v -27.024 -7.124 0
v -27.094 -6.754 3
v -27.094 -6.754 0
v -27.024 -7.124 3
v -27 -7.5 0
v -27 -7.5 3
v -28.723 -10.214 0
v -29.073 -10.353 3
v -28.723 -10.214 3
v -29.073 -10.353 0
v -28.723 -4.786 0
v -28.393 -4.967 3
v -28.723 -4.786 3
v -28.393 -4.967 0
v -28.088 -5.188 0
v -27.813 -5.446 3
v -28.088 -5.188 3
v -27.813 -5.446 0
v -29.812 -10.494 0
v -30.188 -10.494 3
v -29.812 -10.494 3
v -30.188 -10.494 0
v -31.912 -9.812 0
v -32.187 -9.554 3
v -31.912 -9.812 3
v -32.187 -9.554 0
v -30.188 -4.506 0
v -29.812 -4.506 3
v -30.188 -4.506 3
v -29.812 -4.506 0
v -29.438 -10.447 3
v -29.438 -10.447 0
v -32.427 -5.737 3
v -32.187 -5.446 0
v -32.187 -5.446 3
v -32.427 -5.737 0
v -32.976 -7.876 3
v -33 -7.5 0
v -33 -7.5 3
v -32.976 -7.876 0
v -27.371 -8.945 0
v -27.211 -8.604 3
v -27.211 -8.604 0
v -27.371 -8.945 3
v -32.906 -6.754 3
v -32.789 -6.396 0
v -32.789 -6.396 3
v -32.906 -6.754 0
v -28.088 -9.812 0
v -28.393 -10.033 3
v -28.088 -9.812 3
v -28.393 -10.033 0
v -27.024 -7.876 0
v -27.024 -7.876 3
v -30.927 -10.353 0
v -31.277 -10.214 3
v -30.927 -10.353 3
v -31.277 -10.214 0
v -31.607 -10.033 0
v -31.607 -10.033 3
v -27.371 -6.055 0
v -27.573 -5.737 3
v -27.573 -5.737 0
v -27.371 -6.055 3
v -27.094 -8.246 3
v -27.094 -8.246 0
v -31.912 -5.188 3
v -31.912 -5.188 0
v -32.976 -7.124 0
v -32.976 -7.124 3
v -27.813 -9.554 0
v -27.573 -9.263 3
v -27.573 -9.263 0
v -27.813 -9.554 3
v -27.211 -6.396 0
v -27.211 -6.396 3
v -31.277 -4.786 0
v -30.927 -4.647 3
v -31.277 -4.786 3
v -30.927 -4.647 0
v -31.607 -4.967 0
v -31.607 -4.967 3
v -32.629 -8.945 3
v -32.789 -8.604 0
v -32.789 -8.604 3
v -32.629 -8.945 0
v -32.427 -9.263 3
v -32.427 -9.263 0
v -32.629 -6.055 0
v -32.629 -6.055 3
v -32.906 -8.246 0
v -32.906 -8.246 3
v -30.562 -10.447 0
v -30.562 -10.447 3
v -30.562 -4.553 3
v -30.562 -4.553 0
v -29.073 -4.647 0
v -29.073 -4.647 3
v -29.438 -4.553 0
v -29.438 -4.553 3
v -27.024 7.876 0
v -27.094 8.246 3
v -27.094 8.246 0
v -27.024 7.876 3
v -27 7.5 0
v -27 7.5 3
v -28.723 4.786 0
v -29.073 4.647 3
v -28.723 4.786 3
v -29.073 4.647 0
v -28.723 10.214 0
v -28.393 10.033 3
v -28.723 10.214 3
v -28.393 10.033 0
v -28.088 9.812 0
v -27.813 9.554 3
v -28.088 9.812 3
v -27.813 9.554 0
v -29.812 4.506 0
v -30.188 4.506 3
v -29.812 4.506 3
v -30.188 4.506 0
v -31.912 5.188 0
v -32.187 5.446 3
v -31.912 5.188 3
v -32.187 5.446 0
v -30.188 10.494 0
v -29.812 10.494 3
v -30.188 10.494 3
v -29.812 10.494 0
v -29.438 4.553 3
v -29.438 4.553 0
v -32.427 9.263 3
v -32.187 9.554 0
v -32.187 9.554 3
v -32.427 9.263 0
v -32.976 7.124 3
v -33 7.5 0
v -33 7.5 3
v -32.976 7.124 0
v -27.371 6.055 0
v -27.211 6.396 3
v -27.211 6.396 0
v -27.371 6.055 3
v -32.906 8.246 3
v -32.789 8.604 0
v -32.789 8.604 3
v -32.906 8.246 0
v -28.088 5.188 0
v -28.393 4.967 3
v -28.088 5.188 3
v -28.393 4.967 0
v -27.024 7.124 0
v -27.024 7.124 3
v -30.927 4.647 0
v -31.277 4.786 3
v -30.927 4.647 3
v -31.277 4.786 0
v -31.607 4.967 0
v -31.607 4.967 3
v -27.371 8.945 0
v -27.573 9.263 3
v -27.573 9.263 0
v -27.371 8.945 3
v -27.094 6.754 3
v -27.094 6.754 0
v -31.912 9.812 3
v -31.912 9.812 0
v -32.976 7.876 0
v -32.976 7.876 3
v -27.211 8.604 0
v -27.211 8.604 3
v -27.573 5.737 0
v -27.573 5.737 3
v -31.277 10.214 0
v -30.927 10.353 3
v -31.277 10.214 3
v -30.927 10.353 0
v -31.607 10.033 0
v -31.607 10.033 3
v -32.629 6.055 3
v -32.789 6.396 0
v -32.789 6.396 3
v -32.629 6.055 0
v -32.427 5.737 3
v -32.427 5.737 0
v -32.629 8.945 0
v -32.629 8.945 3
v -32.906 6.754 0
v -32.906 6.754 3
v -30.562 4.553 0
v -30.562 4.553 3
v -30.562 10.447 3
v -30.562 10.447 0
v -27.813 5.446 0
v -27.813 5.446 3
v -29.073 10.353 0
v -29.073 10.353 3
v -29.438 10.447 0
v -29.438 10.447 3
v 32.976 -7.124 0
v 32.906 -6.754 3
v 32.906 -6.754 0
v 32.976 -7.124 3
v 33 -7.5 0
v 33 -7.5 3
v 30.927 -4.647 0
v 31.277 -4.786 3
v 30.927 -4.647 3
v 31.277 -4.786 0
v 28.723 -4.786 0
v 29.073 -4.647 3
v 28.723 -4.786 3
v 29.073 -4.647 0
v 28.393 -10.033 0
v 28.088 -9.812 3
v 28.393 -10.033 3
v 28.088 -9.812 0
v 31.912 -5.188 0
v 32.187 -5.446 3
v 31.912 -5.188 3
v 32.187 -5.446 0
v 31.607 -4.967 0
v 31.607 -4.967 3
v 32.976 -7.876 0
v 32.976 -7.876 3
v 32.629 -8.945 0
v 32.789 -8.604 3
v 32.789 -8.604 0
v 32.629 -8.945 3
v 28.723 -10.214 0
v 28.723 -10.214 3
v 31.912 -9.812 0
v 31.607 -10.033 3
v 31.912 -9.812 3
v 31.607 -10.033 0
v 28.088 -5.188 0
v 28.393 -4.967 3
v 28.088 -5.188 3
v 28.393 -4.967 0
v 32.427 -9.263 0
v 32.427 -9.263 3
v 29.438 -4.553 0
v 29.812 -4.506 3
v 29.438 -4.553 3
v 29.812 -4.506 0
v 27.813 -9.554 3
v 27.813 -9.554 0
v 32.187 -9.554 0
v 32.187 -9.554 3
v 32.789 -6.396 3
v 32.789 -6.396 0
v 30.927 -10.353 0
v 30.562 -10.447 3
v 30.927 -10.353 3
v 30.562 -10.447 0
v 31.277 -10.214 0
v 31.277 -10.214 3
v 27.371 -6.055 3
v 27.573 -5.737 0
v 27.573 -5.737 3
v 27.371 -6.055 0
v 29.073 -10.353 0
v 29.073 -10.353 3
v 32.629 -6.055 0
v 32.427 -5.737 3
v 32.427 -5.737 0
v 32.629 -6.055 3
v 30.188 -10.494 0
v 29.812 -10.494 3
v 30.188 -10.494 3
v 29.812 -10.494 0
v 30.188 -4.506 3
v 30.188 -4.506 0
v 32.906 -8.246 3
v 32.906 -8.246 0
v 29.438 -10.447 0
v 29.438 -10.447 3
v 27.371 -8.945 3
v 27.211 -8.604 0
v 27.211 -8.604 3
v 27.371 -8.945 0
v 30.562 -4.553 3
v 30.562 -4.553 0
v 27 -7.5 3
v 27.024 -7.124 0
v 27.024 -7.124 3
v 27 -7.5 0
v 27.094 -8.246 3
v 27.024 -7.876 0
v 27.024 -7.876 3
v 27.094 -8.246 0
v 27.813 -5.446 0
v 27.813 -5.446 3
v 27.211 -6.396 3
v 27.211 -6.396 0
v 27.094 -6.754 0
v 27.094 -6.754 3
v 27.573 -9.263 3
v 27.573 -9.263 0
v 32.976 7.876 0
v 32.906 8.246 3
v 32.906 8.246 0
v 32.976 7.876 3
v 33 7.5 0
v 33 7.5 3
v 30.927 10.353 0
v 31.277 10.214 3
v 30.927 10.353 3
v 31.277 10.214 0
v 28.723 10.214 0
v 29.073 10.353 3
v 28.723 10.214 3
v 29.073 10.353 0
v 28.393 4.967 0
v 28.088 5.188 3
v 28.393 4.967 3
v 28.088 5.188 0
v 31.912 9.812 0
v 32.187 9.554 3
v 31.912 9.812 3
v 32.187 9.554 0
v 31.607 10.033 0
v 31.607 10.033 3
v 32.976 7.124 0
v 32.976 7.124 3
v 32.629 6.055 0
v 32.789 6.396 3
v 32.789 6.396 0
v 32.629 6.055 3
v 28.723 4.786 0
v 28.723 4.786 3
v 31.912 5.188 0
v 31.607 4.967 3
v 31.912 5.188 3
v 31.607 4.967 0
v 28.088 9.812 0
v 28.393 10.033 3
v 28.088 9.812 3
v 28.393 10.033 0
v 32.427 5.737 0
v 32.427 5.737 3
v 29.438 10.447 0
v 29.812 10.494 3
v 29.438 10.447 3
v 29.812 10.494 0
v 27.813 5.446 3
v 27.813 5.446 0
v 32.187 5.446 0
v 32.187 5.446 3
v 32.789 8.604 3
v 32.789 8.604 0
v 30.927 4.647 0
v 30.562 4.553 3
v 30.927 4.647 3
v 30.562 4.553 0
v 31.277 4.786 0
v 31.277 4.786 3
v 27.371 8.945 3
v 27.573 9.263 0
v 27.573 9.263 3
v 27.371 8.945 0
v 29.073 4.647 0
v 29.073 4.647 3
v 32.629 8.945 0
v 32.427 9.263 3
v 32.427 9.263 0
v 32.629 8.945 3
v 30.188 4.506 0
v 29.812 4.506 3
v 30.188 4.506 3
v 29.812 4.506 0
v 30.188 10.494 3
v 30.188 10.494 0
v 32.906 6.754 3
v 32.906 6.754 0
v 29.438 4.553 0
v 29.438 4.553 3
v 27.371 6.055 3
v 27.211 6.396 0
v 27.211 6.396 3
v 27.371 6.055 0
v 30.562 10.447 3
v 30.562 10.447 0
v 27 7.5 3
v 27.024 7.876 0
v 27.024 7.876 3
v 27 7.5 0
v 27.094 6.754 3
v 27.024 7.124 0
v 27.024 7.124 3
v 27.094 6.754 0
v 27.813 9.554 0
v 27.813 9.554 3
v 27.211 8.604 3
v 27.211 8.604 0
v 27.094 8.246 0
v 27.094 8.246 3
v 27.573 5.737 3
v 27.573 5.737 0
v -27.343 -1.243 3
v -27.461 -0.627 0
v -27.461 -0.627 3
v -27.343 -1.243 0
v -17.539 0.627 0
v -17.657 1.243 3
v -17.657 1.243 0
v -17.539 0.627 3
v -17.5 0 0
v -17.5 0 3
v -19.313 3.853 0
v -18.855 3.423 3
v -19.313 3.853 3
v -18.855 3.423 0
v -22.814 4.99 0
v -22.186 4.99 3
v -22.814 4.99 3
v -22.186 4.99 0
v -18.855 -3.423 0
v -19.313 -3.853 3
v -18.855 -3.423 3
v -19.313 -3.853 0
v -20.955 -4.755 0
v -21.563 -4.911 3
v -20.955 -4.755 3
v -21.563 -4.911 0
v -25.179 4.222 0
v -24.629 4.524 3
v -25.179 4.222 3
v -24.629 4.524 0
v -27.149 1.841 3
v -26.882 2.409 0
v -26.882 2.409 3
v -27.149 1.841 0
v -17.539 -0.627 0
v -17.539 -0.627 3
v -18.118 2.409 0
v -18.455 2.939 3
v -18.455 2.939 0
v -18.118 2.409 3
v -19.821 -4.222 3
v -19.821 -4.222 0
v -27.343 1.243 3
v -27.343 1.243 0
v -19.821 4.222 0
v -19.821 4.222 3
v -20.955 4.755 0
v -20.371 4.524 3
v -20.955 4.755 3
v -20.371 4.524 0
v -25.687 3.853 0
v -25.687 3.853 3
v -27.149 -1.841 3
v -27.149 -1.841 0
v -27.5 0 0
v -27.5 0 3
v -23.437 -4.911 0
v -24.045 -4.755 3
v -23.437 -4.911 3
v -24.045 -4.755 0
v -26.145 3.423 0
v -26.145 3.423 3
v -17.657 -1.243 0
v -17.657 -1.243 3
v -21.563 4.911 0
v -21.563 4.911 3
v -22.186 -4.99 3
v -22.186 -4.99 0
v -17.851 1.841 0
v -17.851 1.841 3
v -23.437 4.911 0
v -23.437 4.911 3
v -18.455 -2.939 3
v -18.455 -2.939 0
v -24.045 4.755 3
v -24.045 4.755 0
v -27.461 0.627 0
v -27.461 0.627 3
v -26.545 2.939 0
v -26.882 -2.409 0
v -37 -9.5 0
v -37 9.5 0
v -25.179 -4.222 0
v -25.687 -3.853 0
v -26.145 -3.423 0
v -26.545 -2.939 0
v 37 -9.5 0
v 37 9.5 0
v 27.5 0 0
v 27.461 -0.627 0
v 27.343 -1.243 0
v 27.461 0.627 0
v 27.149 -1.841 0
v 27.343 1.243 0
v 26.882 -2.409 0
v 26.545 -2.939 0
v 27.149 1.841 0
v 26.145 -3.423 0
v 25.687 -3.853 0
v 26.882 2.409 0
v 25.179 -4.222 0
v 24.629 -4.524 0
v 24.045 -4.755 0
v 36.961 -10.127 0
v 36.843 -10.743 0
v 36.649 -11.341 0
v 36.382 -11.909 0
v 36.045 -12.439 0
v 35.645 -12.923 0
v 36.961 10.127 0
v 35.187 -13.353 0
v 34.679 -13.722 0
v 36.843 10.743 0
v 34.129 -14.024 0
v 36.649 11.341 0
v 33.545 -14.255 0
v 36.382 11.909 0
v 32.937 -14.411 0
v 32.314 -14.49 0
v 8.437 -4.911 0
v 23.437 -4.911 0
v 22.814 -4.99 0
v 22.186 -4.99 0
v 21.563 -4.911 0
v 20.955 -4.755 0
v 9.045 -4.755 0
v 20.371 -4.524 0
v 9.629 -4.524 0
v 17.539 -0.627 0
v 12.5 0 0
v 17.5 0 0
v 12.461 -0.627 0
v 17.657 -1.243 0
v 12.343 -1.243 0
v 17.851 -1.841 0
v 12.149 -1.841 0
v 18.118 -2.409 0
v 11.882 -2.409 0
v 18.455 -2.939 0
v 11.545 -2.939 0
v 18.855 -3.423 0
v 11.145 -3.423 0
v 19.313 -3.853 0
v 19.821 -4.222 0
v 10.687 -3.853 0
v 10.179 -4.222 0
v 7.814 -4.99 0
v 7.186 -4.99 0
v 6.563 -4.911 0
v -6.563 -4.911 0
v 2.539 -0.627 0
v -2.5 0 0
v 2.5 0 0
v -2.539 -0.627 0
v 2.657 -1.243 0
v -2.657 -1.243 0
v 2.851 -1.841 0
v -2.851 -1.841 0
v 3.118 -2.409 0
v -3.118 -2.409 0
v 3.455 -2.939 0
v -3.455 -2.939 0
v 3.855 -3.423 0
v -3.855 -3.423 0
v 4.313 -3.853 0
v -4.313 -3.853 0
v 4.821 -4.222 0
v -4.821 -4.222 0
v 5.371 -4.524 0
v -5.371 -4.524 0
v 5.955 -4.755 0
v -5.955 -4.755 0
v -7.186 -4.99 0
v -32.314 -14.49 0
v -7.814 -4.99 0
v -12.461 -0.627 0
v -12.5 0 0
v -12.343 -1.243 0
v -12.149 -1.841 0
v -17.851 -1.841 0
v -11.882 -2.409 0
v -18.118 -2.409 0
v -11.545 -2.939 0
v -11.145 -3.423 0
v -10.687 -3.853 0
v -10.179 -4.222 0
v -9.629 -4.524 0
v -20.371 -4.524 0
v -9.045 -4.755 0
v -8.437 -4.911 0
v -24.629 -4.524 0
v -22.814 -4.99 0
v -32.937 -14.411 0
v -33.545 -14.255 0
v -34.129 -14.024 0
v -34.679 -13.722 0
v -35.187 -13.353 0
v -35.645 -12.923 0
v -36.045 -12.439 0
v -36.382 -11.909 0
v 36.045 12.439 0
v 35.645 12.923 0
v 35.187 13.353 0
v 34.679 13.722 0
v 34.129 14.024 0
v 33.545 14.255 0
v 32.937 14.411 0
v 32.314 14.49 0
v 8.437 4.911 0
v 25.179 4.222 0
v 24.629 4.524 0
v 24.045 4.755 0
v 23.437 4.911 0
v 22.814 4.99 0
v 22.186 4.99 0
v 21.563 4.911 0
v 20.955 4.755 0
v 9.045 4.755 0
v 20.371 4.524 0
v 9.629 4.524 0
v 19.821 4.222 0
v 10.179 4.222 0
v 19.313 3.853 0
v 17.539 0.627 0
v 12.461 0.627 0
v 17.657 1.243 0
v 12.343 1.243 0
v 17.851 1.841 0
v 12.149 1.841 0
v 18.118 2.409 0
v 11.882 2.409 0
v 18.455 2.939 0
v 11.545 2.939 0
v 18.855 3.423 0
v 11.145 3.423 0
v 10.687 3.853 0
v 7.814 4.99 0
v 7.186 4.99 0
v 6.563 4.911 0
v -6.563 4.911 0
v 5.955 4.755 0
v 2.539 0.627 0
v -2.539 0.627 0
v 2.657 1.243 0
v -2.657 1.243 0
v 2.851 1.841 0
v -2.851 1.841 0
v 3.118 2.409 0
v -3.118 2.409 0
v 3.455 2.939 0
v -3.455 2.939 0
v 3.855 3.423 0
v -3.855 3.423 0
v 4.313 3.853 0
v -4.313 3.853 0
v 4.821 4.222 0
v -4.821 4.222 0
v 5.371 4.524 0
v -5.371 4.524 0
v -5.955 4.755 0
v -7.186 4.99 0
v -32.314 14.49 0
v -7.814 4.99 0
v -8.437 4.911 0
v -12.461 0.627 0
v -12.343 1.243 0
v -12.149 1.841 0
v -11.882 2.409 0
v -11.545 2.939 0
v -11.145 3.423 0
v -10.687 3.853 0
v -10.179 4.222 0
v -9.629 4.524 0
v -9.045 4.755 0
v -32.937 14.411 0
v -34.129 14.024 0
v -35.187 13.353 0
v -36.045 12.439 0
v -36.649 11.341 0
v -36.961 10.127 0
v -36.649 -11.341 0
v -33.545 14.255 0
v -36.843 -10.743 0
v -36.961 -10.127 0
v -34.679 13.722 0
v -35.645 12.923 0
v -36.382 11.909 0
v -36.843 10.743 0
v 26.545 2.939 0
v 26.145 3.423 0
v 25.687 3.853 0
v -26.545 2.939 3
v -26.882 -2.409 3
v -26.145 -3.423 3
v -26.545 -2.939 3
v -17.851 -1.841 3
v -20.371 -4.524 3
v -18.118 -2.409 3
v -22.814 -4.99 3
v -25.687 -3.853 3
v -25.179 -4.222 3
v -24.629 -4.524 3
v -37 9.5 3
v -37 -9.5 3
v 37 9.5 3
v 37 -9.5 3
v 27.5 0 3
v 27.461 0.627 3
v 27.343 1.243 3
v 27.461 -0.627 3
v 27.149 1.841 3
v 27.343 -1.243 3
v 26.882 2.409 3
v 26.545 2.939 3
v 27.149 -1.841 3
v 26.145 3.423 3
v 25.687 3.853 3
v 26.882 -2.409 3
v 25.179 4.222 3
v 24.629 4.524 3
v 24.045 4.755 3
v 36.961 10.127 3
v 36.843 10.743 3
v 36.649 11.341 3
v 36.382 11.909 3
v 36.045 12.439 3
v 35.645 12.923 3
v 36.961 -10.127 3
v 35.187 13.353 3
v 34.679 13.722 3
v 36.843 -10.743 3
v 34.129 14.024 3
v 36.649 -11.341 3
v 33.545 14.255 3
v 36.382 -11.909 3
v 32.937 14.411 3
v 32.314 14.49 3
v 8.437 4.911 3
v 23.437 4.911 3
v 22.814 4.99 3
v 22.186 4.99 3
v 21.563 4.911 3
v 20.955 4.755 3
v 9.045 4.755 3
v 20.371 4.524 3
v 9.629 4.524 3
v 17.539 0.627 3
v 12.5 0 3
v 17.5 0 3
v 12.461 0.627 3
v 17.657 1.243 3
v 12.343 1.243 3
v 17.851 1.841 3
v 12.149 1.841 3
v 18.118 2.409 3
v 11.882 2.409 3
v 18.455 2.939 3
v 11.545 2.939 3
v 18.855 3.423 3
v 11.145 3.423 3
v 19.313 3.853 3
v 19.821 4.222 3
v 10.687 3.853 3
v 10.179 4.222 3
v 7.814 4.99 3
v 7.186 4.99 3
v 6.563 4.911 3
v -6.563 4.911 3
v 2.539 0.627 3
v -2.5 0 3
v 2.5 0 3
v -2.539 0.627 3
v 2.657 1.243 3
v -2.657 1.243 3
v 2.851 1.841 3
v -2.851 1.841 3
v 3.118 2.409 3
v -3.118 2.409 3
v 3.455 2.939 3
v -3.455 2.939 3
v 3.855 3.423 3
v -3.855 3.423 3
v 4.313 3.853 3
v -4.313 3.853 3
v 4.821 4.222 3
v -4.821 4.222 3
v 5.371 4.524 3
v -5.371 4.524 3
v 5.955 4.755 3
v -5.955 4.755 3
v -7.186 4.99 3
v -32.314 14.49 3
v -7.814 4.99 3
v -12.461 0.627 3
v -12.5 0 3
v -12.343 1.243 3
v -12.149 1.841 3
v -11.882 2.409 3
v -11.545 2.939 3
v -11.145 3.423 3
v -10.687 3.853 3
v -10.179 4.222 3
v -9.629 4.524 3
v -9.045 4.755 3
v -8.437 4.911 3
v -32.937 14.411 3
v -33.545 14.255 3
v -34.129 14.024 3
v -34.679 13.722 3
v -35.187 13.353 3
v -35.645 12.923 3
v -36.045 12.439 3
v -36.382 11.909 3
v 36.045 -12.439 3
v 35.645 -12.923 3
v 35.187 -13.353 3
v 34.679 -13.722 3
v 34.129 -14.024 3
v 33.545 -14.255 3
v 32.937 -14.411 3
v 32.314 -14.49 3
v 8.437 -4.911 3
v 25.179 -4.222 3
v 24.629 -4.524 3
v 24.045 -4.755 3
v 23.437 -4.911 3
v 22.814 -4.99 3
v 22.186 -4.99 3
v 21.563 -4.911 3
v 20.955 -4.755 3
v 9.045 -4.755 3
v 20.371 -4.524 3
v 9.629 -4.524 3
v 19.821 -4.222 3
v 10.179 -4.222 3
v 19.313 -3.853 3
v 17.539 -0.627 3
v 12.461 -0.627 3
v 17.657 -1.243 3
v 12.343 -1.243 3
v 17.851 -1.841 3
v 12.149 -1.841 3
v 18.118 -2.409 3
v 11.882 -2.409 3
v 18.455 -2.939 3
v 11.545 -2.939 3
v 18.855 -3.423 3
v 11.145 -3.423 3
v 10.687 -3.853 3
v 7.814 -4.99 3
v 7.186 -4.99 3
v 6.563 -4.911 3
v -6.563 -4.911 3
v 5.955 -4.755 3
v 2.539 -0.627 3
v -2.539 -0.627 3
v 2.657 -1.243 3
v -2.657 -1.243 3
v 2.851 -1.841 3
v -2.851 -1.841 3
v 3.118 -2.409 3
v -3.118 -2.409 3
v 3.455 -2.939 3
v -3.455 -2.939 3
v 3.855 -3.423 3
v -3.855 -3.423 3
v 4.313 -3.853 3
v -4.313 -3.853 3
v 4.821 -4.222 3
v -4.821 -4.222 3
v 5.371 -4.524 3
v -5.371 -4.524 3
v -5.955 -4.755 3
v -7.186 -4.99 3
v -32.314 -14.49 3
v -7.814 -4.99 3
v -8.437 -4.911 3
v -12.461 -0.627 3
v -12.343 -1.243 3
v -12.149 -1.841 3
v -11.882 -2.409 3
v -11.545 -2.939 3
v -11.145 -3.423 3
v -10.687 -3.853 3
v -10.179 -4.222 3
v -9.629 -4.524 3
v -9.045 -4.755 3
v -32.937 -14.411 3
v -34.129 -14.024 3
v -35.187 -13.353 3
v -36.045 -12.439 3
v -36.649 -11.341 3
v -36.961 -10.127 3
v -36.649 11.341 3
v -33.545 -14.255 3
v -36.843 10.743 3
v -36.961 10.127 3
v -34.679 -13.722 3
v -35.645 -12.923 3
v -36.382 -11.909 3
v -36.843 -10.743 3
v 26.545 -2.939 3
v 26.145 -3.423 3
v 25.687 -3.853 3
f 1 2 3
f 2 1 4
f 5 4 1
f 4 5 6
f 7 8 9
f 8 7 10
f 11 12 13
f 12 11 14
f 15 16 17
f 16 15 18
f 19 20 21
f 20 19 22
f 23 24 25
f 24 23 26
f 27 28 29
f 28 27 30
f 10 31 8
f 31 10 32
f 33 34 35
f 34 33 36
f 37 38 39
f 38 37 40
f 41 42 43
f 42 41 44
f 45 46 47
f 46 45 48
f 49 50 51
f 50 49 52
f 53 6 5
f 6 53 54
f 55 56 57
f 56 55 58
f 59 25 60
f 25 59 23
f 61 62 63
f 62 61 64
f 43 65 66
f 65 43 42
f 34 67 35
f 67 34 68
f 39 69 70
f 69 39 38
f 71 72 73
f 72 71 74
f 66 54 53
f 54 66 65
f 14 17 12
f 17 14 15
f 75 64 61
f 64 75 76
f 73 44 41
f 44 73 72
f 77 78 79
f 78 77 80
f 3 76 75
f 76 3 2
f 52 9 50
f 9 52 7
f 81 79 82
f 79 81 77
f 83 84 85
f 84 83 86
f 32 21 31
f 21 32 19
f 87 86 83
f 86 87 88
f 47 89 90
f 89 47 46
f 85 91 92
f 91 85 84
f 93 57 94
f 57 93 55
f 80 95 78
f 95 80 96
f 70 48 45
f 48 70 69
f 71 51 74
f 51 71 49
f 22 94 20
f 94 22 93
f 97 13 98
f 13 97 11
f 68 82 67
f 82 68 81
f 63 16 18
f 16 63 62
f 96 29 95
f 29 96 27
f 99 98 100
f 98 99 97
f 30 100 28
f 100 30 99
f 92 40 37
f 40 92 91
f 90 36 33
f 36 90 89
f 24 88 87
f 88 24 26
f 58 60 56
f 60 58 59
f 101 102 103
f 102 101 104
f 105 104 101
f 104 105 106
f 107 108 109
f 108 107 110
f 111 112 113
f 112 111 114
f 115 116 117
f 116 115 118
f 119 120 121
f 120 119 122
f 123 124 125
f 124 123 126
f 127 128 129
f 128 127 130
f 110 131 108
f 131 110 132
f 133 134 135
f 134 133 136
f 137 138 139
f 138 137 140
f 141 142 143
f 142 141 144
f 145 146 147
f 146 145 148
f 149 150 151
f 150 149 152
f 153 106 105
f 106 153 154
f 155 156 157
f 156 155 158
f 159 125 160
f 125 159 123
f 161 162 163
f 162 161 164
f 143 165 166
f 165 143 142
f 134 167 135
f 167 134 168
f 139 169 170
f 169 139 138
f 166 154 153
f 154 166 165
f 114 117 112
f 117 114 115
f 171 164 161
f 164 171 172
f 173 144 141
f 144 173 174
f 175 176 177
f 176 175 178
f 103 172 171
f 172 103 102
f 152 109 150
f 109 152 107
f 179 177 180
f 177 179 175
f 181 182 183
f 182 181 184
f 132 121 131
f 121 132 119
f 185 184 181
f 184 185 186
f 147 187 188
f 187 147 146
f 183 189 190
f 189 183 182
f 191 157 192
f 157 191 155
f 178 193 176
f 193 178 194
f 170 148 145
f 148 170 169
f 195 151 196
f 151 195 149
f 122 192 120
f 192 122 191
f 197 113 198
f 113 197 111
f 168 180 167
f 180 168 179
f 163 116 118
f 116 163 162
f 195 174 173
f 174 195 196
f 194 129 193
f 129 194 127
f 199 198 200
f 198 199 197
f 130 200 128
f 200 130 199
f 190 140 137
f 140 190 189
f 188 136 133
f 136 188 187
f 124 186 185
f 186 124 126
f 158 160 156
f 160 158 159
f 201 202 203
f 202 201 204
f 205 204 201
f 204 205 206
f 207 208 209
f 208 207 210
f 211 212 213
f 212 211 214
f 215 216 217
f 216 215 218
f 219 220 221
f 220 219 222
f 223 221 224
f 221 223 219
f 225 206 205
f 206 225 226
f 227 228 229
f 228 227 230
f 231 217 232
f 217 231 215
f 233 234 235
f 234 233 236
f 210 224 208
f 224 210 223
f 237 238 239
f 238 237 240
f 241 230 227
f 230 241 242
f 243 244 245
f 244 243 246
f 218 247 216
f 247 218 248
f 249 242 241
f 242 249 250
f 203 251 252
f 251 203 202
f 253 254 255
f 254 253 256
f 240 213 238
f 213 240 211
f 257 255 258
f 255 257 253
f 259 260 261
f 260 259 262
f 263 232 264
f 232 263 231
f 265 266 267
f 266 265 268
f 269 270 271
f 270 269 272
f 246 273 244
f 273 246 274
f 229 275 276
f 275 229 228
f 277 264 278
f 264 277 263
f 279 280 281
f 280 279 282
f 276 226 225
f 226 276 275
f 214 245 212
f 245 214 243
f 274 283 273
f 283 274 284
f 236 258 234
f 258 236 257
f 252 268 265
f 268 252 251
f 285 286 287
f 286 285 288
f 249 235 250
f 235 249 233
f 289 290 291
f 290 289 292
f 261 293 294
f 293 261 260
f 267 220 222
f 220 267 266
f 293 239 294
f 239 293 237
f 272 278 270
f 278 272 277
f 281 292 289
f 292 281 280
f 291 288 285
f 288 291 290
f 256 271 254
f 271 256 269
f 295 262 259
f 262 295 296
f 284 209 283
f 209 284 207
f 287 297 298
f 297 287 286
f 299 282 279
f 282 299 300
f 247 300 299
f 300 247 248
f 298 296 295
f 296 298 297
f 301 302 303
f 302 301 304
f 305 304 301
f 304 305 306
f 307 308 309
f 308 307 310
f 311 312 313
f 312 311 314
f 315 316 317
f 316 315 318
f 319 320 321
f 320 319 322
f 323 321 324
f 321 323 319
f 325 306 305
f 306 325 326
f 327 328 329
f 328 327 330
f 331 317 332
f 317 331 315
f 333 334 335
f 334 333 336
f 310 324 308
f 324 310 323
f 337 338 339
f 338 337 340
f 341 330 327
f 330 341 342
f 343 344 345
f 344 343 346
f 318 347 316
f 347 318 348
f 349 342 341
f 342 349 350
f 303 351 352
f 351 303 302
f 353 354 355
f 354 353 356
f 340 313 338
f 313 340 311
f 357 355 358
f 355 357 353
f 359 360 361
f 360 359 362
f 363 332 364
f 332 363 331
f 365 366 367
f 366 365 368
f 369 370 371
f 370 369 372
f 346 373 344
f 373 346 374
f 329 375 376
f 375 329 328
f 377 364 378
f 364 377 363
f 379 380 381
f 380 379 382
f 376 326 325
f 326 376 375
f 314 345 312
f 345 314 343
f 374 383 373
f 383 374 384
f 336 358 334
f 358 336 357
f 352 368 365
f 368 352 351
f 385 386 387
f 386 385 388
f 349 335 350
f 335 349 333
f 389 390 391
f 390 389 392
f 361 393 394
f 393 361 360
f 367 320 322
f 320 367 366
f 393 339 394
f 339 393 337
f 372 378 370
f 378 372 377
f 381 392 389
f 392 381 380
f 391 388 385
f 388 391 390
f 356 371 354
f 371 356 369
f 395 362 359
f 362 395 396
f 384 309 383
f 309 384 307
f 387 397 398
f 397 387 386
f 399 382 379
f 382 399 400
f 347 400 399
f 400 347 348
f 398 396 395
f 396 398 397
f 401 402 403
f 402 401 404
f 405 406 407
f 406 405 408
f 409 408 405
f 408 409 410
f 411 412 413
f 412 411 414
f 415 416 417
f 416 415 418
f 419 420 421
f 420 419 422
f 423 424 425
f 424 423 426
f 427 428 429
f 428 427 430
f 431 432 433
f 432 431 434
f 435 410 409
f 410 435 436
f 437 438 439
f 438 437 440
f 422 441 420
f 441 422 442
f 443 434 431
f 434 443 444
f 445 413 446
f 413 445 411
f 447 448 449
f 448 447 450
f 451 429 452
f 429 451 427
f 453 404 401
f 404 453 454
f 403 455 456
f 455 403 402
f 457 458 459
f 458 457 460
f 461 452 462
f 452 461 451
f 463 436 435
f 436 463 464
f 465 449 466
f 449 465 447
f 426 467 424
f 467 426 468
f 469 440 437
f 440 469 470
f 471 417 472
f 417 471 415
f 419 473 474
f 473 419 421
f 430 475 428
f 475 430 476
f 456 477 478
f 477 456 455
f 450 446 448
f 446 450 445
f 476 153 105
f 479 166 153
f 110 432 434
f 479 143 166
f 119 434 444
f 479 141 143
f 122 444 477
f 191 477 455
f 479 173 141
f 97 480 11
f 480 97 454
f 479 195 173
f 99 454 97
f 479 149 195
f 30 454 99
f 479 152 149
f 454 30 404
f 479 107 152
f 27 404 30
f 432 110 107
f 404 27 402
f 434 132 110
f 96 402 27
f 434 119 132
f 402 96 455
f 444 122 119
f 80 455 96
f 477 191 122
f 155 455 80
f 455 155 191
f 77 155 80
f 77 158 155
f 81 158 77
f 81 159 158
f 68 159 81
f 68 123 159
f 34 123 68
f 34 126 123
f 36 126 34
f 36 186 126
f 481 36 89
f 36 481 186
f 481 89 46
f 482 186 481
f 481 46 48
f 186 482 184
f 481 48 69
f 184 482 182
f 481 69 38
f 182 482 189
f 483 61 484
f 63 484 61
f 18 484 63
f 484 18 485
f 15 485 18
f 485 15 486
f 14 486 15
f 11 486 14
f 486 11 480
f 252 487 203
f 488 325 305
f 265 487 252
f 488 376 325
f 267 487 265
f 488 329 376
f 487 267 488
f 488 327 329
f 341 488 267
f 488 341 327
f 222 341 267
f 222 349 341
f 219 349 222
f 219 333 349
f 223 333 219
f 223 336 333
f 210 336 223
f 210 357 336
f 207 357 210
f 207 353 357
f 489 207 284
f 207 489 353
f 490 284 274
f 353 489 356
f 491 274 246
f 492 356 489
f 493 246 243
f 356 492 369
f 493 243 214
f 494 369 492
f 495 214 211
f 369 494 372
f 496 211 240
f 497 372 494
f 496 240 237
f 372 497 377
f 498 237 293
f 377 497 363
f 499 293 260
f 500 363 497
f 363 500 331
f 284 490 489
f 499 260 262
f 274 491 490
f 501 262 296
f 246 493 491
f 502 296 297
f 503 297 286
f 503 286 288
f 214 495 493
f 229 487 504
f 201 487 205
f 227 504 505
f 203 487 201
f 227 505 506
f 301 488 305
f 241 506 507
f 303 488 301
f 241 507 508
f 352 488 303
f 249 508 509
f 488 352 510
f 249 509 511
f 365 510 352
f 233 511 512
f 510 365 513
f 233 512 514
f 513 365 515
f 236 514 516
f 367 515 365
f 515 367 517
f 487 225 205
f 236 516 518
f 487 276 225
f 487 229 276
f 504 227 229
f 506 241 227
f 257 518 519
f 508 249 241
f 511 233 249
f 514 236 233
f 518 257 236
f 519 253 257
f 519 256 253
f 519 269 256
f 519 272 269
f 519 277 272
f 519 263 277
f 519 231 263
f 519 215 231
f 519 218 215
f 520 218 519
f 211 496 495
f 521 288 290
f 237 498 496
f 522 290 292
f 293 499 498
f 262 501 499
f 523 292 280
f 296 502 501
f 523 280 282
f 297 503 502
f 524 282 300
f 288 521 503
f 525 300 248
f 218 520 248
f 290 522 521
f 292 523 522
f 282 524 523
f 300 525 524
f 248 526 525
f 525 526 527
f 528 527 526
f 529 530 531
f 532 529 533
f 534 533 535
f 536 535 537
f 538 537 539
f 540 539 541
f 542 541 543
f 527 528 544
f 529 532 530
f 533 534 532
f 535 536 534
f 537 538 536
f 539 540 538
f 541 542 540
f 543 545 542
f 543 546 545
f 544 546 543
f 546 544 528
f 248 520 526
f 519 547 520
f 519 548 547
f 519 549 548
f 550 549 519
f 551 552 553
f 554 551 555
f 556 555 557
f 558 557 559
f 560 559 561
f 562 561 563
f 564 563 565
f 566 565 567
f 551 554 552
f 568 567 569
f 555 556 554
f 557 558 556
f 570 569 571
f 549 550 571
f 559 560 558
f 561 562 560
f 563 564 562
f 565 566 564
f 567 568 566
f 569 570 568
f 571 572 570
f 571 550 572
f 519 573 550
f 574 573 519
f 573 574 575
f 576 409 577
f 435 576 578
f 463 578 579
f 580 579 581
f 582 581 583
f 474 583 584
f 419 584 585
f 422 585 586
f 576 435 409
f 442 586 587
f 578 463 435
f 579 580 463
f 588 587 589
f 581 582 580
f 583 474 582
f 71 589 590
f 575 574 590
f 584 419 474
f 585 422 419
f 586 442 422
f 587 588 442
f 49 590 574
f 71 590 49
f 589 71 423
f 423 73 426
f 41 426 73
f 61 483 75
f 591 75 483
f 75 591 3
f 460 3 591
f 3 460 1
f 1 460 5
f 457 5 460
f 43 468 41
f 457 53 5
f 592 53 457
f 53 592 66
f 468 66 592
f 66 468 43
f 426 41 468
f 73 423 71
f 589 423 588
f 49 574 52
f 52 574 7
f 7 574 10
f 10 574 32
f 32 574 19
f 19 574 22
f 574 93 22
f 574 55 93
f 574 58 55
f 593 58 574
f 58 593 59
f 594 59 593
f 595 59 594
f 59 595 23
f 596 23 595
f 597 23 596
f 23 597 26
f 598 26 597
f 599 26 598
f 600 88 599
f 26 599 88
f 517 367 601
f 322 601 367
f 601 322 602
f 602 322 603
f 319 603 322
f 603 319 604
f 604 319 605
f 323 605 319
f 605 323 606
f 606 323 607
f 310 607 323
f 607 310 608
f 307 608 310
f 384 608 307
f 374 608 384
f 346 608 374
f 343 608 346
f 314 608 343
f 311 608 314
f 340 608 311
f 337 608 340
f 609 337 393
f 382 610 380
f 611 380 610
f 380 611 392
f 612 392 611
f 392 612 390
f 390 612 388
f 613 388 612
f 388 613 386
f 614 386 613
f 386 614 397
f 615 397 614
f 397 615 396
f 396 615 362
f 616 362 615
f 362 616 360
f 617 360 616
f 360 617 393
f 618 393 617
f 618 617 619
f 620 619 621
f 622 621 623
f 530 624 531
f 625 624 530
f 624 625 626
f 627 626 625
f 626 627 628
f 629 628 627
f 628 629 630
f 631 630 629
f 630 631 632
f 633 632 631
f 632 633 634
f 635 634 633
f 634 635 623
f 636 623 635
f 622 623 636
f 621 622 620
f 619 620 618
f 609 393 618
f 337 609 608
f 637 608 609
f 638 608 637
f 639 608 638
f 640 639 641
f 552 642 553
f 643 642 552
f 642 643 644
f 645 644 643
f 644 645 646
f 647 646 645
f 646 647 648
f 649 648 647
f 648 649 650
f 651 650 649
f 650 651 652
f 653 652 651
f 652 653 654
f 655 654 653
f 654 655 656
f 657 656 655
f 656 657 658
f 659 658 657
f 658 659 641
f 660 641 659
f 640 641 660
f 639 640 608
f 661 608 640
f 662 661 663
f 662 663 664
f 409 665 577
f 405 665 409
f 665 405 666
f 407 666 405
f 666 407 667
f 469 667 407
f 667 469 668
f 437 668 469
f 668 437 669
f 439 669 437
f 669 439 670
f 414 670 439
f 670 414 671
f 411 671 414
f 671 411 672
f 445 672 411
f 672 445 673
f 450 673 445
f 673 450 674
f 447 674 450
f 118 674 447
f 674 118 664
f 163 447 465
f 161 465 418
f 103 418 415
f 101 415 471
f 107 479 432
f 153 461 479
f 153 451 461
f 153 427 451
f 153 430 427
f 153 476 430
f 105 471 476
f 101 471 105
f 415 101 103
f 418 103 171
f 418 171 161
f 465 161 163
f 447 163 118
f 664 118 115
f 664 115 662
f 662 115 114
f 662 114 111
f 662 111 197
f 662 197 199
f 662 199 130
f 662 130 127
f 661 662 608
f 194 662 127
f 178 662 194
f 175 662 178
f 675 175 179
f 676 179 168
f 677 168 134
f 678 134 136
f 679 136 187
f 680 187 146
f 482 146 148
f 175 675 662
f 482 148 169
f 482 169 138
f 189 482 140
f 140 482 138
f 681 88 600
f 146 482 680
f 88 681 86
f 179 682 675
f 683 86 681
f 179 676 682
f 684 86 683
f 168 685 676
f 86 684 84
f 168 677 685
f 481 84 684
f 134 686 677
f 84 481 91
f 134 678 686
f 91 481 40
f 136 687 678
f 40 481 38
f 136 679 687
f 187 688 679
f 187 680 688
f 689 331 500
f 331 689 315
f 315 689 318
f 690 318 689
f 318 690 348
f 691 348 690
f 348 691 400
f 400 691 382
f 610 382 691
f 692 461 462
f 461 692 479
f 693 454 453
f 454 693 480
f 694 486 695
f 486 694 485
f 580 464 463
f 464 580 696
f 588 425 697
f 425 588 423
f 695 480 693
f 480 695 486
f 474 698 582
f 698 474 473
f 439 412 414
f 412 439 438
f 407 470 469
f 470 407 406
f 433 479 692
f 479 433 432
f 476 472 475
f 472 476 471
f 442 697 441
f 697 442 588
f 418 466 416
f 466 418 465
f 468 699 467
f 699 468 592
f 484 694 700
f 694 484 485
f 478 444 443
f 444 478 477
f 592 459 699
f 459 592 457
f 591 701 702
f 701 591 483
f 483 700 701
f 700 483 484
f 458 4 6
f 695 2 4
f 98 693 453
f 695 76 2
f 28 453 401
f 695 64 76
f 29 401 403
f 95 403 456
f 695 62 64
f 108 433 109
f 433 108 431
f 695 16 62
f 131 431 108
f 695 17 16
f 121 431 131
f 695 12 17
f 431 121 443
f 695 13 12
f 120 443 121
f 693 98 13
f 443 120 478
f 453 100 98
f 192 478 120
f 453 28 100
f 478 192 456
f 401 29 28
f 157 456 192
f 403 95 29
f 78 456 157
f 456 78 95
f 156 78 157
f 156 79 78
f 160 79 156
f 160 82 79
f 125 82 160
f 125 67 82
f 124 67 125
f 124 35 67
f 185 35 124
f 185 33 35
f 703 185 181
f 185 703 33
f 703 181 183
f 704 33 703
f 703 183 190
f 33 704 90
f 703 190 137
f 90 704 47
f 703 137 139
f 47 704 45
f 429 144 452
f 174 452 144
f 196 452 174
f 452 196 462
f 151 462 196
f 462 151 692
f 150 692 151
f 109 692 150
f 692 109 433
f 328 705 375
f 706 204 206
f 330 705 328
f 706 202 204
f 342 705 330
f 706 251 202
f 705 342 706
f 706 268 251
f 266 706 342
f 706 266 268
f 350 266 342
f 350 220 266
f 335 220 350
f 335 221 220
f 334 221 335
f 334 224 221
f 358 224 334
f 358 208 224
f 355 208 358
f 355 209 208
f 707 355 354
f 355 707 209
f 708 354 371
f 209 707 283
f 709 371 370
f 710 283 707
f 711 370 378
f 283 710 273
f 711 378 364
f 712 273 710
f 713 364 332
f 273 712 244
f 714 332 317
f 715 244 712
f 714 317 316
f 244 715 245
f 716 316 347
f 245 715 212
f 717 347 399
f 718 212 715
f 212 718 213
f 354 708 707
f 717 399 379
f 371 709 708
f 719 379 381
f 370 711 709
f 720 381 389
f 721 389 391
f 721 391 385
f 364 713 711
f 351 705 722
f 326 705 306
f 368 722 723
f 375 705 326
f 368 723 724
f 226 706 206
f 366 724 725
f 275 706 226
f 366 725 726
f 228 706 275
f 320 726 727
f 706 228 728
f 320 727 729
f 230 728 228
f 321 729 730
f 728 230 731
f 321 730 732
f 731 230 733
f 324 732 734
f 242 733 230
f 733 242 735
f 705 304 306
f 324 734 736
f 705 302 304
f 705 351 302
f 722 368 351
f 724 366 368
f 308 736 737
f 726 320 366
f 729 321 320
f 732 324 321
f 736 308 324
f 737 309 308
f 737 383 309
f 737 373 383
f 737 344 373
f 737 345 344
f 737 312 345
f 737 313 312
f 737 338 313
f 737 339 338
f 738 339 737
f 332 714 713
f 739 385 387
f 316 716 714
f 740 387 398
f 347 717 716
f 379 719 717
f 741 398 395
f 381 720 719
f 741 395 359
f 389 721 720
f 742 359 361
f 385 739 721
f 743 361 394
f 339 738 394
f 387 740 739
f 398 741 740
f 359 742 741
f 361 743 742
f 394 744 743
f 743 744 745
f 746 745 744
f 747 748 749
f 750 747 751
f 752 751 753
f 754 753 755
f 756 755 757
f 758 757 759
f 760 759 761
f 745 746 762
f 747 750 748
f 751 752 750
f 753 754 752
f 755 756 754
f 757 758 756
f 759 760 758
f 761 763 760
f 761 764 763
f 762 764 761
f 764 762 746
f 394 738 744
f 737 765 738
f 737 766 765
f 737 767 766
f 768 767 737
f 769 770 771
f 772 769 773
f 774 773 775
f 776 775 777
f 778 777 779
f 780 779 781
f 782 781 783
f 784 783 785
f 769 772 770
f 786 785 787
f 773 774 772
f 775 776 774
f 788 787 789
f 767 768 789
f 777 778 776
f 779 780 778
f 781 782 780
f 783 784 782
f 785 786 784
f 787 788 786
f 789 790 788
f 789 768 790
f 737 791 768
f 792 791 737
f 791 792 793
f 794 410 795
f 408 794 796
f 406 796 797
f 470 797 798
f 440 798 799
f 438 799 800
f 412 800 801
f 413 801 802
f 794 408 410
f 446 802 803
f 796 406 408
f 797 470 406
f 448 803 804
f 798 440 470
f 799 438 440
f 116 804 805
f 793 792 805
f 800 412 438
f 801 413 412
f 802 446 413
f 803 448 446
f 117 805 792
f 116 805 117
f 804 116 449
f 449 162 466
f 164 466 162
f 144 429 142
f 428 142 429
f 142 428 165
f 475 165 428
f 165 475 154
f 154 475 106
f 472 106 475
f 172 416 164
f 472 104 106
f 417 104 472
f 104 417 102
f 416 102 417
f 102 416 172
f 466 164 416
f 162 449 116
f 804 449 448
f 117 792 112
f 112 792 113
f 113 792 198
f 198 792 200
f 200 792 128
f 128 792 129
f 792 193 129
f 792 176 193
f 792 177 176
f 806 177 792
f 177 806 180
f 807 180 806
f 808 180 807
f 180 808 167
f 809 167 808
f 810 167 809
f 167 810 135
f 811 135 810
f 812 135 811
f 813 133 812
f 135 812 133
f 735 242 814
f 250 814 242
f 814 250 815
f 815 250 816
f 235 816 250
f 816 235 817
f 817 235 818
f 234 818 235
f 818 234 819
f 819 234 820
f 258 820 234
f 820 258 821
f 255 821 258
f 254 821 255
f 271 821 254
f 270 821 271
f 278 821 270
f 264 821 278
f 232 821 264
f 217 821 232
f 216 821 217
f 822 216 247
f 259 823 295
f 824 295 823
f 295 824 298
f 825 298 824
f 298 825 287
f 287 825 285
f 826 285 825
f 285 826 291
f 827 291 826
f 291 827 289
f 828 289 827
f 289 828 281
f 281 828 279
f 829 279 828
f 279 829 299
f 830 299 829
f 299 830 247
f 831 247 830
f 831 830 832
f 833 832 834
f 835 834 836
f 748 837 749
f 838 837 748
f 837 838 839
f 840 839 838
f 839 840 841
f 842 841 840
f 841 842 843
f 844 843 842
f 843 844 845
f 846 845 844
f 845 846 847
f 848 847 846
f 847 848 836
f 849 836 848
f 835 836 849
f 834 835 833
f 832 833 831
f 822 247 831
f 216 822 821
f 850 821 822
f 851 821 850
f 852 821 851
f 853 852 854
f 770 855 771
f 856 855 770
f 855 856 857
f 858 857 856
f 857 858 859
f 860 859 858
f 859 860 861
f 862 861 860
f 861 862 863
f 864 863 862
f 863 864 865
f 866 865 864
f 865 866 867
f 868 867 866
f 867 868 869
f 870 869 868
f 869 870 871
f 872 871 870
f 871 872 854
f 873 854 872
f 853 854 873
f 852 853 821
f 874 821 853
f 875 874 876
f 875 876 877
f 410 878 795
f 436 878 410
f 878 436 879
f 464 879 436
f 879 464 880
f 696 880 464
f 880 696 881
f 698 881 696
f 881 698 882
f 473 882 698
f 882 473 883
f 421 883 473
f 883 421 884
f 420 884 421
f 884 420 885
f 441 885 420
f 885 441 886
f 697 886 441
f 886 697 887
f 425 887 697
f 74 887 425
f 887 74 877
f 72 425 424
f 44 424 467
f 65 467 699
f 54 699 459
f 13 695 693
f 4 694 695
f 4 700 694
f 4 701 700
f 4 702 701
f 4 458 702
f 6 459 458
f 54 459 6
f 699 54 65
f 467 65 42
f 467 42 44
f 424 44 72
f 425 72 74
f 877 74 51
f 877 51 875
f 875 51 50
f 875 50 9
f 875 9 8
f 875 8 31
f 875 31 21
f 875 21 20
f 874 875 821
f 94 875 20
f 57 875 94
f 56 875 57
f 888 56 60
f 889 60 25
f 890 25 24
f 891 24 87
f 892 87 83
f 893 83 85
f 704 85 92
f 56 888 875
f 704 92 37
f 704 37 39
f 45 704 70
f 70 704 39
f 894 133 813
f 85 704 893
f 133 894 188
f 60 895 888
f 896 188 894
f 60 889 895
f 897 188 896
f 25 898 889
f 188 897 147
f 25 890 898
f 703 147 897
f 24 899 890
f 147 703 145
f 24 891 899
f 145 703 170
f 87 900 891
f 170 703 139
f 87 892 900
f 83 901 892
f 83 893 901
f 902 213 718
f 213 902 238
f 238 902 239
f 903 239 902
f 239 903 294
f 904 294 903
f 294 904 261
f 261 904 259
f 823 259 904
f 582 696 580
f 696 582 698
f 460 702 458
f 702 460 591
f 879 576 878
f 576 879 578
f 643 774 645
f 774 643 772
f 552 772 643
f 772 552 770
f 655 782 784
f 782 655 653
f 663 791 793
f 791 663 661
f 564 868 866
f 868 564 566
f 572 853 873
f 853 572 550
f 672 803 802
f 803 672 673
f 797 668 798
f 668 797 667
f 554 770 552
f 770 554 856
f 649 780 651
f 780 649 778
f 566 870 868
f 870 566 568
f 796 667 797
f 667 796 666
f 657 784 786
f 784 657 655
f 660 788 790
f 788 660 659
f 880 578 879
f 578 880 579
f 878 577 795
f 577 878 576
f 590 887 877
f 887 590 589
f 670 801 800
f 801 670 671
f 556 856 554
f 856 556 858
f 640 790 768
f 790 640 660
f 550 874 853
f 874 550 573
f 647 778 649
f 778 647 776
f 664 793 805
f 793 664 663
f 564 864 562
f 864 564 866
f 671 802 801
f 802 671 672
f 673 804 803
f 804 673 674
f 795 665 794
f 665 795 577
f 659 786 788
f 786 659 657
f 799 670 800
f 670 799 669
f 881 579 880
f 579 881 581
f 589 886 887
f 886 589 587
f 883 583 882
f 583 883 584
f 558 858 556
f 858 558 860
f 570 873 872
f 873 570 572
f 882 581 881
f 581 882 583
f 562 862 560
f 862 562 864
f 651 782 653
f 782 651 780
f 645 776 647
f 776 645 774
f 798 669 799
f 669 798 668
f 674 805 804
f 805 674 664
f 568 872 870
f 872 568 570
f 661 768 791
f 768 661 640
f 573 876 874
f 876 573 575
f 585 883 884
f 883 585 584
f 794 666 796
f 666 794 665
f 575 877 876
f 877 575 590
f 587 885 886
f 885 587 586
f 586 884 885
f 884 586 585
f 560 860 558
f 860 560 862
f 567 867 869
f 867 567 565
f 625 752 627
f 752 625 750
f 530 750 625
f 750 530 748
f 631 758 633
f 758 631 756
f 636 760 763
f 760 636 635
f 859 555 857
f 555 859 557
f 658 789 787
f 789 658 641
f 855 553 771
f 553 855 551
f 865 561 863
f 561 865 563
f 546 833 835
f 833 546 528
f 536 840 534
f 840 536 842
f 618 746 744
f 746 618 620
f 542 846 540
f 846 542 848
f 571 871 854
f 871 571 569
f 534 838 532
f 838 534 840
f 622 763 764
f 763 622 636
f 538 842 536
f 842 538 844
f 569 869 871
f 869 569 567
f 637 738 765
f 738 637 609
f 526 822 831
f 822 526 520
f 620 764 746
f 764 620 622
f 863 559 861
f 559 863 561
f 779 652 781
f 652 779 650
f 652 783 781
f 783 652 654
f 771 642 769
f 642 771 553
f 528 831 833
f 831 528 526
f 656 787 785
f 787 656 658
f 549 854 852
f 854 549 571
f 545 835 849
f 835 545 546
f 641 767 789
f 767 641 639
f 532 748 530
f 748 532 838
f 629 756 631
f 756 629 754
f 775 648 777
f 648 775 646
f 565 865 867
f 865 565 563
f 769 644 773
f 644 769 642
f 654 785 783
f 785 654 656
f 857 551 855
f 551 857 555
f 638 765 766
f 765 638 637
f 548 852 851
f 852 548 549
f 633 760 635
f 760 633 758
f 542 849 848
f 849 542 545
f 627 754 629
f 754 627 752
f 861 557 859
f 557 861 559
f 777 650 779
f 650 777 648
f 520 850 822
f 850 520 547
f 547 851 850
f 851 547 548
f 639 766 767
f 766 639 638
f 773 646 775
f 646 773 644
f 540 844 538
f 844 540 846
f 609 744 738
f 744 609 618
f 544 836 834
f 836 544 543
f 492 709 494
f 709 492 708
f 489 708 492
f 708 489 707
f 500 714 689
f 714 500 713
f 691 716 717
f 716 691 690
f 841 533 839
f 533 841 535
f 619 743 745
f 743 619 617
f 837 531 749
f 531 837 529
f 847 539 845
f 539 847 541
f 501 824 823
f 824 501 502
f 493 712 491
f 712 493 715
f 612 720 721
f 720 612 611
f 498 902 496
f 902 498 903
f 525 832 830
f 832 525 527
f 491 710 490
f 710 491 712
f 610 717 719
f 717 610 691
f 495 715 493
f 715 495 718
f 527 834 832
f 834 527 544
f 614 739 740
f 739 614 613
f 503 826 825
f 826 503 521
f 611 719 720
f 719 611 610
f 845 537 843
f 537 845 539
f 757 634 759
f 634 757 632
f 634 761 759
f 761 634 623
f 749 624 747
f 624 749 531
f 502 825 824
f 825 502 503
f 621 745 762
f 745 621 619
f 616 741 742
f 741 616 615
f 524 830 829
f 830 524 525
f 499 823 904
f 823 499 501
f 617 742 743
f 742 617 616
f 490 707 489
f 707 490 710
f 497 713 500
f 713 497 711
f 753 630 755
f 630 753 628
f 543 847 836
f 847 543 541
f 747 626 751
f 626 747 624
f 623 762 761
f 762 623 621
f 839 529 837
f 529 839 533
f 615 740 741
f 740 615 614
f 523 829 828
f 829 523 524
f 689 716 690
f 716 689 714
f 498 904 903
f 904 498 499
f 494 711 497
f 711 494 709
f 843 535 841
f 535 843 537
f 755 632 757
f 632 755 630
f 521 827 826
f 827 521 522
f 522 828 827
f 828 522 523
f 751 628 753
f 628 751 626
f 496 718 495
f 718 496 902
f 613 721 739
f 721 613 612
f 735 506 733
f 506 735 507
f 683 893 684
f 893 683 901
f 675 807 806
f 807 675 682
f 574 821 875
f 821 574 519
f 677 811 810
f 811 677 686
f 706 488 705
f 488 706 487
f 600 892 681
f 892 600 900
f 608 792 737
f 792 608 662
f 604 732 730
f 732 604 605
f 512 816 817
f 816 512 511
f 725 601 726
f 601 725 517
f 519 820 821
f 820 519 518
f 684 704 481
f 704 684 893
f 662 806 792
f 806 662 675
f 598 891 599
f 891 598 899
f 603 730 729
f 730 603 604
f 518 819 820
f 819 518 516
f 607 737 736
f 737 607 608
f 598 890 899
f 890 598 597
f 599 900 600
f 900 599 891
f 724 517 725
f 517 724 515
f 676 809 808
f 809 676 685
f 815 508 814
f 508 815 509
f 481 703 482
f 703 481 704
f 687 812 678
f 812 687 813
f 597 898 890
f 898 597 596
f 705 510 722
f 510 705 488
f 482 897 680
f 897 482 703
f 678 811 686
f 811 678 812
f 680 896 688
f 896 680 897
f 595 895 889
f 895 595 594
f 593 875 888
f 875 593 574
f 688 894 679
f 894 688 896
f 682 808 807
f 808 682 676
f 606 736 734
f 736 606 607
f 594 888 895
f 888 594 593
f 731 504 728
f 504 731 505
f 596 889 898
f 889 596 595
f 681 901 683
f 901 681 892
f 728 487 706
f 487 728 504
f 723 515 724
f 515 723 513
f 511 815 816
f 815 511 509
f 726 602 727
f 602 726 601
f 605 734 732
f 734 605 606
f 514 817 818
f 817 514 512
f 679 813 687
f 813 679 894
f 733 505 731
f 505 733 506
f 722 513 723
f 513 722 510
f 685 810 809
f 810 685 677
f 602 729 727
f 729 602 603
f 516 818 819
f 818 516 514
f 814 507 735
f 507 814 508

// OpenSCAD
$fn = 50;


difference() {
	union() {
		hull() {
			translate(v = [-32.0000000000, 9.5000000000, 0]) {
				cylinder(h = 3, r = 5);
			}
			translate(v = [32.0000000000, 9.5000000000, 0]) {
				cylinder(h = 3, r = 5);
			}
			translate(v = [-32.0000000000, -9.5000000000, 0]) {
				cylinder(h = 3, r = 5);
			}
			translate(v = [32.0000000000, -9.5000000000, 0]) {
				cylinder(h = 3, r = 5);
			}
		}
	}
	union() {
		#translate(v = [-30.0000000000, -7.5000000000, -100.0000000000]) {
			cylinder(h = 200, r = 3.0000000000);
		}
		#translate(v = [-30.0000000000, 7.5000000000, -100.0000000000]) {
			cylinder(h = 200, r = 3.0000000000);
		}
		#translate(v = [30.0000000000, -7.5000000000, -100.0000000000]) {
			cylinder(h = 200, r = 3.0000000000);
		}
		#translate(v = [30.0000000000, 7.5000000000, -100.0000000000]) {
			cylinder(h = 200, r = 3.0000000000);
		}
		#translate(v = [-22.5000000000, 0, 0]) {
			cylinder(h = 3, r = 5.0000000000);
		}
		#translate(v = [-7.5000000000, 0, 0]) {
			cylinder(h = 3, r = 5.0000000000);
		}
		#translate(v = [7.5000000000, 0, 0]) {
			cylinder(h = 3, r = 5.0000000000);
		}
		#translate(v = [22.5000000000, 0, 0]) {
			cylinder(h = 3, r = 5.0000000000);
		}
	}
}
